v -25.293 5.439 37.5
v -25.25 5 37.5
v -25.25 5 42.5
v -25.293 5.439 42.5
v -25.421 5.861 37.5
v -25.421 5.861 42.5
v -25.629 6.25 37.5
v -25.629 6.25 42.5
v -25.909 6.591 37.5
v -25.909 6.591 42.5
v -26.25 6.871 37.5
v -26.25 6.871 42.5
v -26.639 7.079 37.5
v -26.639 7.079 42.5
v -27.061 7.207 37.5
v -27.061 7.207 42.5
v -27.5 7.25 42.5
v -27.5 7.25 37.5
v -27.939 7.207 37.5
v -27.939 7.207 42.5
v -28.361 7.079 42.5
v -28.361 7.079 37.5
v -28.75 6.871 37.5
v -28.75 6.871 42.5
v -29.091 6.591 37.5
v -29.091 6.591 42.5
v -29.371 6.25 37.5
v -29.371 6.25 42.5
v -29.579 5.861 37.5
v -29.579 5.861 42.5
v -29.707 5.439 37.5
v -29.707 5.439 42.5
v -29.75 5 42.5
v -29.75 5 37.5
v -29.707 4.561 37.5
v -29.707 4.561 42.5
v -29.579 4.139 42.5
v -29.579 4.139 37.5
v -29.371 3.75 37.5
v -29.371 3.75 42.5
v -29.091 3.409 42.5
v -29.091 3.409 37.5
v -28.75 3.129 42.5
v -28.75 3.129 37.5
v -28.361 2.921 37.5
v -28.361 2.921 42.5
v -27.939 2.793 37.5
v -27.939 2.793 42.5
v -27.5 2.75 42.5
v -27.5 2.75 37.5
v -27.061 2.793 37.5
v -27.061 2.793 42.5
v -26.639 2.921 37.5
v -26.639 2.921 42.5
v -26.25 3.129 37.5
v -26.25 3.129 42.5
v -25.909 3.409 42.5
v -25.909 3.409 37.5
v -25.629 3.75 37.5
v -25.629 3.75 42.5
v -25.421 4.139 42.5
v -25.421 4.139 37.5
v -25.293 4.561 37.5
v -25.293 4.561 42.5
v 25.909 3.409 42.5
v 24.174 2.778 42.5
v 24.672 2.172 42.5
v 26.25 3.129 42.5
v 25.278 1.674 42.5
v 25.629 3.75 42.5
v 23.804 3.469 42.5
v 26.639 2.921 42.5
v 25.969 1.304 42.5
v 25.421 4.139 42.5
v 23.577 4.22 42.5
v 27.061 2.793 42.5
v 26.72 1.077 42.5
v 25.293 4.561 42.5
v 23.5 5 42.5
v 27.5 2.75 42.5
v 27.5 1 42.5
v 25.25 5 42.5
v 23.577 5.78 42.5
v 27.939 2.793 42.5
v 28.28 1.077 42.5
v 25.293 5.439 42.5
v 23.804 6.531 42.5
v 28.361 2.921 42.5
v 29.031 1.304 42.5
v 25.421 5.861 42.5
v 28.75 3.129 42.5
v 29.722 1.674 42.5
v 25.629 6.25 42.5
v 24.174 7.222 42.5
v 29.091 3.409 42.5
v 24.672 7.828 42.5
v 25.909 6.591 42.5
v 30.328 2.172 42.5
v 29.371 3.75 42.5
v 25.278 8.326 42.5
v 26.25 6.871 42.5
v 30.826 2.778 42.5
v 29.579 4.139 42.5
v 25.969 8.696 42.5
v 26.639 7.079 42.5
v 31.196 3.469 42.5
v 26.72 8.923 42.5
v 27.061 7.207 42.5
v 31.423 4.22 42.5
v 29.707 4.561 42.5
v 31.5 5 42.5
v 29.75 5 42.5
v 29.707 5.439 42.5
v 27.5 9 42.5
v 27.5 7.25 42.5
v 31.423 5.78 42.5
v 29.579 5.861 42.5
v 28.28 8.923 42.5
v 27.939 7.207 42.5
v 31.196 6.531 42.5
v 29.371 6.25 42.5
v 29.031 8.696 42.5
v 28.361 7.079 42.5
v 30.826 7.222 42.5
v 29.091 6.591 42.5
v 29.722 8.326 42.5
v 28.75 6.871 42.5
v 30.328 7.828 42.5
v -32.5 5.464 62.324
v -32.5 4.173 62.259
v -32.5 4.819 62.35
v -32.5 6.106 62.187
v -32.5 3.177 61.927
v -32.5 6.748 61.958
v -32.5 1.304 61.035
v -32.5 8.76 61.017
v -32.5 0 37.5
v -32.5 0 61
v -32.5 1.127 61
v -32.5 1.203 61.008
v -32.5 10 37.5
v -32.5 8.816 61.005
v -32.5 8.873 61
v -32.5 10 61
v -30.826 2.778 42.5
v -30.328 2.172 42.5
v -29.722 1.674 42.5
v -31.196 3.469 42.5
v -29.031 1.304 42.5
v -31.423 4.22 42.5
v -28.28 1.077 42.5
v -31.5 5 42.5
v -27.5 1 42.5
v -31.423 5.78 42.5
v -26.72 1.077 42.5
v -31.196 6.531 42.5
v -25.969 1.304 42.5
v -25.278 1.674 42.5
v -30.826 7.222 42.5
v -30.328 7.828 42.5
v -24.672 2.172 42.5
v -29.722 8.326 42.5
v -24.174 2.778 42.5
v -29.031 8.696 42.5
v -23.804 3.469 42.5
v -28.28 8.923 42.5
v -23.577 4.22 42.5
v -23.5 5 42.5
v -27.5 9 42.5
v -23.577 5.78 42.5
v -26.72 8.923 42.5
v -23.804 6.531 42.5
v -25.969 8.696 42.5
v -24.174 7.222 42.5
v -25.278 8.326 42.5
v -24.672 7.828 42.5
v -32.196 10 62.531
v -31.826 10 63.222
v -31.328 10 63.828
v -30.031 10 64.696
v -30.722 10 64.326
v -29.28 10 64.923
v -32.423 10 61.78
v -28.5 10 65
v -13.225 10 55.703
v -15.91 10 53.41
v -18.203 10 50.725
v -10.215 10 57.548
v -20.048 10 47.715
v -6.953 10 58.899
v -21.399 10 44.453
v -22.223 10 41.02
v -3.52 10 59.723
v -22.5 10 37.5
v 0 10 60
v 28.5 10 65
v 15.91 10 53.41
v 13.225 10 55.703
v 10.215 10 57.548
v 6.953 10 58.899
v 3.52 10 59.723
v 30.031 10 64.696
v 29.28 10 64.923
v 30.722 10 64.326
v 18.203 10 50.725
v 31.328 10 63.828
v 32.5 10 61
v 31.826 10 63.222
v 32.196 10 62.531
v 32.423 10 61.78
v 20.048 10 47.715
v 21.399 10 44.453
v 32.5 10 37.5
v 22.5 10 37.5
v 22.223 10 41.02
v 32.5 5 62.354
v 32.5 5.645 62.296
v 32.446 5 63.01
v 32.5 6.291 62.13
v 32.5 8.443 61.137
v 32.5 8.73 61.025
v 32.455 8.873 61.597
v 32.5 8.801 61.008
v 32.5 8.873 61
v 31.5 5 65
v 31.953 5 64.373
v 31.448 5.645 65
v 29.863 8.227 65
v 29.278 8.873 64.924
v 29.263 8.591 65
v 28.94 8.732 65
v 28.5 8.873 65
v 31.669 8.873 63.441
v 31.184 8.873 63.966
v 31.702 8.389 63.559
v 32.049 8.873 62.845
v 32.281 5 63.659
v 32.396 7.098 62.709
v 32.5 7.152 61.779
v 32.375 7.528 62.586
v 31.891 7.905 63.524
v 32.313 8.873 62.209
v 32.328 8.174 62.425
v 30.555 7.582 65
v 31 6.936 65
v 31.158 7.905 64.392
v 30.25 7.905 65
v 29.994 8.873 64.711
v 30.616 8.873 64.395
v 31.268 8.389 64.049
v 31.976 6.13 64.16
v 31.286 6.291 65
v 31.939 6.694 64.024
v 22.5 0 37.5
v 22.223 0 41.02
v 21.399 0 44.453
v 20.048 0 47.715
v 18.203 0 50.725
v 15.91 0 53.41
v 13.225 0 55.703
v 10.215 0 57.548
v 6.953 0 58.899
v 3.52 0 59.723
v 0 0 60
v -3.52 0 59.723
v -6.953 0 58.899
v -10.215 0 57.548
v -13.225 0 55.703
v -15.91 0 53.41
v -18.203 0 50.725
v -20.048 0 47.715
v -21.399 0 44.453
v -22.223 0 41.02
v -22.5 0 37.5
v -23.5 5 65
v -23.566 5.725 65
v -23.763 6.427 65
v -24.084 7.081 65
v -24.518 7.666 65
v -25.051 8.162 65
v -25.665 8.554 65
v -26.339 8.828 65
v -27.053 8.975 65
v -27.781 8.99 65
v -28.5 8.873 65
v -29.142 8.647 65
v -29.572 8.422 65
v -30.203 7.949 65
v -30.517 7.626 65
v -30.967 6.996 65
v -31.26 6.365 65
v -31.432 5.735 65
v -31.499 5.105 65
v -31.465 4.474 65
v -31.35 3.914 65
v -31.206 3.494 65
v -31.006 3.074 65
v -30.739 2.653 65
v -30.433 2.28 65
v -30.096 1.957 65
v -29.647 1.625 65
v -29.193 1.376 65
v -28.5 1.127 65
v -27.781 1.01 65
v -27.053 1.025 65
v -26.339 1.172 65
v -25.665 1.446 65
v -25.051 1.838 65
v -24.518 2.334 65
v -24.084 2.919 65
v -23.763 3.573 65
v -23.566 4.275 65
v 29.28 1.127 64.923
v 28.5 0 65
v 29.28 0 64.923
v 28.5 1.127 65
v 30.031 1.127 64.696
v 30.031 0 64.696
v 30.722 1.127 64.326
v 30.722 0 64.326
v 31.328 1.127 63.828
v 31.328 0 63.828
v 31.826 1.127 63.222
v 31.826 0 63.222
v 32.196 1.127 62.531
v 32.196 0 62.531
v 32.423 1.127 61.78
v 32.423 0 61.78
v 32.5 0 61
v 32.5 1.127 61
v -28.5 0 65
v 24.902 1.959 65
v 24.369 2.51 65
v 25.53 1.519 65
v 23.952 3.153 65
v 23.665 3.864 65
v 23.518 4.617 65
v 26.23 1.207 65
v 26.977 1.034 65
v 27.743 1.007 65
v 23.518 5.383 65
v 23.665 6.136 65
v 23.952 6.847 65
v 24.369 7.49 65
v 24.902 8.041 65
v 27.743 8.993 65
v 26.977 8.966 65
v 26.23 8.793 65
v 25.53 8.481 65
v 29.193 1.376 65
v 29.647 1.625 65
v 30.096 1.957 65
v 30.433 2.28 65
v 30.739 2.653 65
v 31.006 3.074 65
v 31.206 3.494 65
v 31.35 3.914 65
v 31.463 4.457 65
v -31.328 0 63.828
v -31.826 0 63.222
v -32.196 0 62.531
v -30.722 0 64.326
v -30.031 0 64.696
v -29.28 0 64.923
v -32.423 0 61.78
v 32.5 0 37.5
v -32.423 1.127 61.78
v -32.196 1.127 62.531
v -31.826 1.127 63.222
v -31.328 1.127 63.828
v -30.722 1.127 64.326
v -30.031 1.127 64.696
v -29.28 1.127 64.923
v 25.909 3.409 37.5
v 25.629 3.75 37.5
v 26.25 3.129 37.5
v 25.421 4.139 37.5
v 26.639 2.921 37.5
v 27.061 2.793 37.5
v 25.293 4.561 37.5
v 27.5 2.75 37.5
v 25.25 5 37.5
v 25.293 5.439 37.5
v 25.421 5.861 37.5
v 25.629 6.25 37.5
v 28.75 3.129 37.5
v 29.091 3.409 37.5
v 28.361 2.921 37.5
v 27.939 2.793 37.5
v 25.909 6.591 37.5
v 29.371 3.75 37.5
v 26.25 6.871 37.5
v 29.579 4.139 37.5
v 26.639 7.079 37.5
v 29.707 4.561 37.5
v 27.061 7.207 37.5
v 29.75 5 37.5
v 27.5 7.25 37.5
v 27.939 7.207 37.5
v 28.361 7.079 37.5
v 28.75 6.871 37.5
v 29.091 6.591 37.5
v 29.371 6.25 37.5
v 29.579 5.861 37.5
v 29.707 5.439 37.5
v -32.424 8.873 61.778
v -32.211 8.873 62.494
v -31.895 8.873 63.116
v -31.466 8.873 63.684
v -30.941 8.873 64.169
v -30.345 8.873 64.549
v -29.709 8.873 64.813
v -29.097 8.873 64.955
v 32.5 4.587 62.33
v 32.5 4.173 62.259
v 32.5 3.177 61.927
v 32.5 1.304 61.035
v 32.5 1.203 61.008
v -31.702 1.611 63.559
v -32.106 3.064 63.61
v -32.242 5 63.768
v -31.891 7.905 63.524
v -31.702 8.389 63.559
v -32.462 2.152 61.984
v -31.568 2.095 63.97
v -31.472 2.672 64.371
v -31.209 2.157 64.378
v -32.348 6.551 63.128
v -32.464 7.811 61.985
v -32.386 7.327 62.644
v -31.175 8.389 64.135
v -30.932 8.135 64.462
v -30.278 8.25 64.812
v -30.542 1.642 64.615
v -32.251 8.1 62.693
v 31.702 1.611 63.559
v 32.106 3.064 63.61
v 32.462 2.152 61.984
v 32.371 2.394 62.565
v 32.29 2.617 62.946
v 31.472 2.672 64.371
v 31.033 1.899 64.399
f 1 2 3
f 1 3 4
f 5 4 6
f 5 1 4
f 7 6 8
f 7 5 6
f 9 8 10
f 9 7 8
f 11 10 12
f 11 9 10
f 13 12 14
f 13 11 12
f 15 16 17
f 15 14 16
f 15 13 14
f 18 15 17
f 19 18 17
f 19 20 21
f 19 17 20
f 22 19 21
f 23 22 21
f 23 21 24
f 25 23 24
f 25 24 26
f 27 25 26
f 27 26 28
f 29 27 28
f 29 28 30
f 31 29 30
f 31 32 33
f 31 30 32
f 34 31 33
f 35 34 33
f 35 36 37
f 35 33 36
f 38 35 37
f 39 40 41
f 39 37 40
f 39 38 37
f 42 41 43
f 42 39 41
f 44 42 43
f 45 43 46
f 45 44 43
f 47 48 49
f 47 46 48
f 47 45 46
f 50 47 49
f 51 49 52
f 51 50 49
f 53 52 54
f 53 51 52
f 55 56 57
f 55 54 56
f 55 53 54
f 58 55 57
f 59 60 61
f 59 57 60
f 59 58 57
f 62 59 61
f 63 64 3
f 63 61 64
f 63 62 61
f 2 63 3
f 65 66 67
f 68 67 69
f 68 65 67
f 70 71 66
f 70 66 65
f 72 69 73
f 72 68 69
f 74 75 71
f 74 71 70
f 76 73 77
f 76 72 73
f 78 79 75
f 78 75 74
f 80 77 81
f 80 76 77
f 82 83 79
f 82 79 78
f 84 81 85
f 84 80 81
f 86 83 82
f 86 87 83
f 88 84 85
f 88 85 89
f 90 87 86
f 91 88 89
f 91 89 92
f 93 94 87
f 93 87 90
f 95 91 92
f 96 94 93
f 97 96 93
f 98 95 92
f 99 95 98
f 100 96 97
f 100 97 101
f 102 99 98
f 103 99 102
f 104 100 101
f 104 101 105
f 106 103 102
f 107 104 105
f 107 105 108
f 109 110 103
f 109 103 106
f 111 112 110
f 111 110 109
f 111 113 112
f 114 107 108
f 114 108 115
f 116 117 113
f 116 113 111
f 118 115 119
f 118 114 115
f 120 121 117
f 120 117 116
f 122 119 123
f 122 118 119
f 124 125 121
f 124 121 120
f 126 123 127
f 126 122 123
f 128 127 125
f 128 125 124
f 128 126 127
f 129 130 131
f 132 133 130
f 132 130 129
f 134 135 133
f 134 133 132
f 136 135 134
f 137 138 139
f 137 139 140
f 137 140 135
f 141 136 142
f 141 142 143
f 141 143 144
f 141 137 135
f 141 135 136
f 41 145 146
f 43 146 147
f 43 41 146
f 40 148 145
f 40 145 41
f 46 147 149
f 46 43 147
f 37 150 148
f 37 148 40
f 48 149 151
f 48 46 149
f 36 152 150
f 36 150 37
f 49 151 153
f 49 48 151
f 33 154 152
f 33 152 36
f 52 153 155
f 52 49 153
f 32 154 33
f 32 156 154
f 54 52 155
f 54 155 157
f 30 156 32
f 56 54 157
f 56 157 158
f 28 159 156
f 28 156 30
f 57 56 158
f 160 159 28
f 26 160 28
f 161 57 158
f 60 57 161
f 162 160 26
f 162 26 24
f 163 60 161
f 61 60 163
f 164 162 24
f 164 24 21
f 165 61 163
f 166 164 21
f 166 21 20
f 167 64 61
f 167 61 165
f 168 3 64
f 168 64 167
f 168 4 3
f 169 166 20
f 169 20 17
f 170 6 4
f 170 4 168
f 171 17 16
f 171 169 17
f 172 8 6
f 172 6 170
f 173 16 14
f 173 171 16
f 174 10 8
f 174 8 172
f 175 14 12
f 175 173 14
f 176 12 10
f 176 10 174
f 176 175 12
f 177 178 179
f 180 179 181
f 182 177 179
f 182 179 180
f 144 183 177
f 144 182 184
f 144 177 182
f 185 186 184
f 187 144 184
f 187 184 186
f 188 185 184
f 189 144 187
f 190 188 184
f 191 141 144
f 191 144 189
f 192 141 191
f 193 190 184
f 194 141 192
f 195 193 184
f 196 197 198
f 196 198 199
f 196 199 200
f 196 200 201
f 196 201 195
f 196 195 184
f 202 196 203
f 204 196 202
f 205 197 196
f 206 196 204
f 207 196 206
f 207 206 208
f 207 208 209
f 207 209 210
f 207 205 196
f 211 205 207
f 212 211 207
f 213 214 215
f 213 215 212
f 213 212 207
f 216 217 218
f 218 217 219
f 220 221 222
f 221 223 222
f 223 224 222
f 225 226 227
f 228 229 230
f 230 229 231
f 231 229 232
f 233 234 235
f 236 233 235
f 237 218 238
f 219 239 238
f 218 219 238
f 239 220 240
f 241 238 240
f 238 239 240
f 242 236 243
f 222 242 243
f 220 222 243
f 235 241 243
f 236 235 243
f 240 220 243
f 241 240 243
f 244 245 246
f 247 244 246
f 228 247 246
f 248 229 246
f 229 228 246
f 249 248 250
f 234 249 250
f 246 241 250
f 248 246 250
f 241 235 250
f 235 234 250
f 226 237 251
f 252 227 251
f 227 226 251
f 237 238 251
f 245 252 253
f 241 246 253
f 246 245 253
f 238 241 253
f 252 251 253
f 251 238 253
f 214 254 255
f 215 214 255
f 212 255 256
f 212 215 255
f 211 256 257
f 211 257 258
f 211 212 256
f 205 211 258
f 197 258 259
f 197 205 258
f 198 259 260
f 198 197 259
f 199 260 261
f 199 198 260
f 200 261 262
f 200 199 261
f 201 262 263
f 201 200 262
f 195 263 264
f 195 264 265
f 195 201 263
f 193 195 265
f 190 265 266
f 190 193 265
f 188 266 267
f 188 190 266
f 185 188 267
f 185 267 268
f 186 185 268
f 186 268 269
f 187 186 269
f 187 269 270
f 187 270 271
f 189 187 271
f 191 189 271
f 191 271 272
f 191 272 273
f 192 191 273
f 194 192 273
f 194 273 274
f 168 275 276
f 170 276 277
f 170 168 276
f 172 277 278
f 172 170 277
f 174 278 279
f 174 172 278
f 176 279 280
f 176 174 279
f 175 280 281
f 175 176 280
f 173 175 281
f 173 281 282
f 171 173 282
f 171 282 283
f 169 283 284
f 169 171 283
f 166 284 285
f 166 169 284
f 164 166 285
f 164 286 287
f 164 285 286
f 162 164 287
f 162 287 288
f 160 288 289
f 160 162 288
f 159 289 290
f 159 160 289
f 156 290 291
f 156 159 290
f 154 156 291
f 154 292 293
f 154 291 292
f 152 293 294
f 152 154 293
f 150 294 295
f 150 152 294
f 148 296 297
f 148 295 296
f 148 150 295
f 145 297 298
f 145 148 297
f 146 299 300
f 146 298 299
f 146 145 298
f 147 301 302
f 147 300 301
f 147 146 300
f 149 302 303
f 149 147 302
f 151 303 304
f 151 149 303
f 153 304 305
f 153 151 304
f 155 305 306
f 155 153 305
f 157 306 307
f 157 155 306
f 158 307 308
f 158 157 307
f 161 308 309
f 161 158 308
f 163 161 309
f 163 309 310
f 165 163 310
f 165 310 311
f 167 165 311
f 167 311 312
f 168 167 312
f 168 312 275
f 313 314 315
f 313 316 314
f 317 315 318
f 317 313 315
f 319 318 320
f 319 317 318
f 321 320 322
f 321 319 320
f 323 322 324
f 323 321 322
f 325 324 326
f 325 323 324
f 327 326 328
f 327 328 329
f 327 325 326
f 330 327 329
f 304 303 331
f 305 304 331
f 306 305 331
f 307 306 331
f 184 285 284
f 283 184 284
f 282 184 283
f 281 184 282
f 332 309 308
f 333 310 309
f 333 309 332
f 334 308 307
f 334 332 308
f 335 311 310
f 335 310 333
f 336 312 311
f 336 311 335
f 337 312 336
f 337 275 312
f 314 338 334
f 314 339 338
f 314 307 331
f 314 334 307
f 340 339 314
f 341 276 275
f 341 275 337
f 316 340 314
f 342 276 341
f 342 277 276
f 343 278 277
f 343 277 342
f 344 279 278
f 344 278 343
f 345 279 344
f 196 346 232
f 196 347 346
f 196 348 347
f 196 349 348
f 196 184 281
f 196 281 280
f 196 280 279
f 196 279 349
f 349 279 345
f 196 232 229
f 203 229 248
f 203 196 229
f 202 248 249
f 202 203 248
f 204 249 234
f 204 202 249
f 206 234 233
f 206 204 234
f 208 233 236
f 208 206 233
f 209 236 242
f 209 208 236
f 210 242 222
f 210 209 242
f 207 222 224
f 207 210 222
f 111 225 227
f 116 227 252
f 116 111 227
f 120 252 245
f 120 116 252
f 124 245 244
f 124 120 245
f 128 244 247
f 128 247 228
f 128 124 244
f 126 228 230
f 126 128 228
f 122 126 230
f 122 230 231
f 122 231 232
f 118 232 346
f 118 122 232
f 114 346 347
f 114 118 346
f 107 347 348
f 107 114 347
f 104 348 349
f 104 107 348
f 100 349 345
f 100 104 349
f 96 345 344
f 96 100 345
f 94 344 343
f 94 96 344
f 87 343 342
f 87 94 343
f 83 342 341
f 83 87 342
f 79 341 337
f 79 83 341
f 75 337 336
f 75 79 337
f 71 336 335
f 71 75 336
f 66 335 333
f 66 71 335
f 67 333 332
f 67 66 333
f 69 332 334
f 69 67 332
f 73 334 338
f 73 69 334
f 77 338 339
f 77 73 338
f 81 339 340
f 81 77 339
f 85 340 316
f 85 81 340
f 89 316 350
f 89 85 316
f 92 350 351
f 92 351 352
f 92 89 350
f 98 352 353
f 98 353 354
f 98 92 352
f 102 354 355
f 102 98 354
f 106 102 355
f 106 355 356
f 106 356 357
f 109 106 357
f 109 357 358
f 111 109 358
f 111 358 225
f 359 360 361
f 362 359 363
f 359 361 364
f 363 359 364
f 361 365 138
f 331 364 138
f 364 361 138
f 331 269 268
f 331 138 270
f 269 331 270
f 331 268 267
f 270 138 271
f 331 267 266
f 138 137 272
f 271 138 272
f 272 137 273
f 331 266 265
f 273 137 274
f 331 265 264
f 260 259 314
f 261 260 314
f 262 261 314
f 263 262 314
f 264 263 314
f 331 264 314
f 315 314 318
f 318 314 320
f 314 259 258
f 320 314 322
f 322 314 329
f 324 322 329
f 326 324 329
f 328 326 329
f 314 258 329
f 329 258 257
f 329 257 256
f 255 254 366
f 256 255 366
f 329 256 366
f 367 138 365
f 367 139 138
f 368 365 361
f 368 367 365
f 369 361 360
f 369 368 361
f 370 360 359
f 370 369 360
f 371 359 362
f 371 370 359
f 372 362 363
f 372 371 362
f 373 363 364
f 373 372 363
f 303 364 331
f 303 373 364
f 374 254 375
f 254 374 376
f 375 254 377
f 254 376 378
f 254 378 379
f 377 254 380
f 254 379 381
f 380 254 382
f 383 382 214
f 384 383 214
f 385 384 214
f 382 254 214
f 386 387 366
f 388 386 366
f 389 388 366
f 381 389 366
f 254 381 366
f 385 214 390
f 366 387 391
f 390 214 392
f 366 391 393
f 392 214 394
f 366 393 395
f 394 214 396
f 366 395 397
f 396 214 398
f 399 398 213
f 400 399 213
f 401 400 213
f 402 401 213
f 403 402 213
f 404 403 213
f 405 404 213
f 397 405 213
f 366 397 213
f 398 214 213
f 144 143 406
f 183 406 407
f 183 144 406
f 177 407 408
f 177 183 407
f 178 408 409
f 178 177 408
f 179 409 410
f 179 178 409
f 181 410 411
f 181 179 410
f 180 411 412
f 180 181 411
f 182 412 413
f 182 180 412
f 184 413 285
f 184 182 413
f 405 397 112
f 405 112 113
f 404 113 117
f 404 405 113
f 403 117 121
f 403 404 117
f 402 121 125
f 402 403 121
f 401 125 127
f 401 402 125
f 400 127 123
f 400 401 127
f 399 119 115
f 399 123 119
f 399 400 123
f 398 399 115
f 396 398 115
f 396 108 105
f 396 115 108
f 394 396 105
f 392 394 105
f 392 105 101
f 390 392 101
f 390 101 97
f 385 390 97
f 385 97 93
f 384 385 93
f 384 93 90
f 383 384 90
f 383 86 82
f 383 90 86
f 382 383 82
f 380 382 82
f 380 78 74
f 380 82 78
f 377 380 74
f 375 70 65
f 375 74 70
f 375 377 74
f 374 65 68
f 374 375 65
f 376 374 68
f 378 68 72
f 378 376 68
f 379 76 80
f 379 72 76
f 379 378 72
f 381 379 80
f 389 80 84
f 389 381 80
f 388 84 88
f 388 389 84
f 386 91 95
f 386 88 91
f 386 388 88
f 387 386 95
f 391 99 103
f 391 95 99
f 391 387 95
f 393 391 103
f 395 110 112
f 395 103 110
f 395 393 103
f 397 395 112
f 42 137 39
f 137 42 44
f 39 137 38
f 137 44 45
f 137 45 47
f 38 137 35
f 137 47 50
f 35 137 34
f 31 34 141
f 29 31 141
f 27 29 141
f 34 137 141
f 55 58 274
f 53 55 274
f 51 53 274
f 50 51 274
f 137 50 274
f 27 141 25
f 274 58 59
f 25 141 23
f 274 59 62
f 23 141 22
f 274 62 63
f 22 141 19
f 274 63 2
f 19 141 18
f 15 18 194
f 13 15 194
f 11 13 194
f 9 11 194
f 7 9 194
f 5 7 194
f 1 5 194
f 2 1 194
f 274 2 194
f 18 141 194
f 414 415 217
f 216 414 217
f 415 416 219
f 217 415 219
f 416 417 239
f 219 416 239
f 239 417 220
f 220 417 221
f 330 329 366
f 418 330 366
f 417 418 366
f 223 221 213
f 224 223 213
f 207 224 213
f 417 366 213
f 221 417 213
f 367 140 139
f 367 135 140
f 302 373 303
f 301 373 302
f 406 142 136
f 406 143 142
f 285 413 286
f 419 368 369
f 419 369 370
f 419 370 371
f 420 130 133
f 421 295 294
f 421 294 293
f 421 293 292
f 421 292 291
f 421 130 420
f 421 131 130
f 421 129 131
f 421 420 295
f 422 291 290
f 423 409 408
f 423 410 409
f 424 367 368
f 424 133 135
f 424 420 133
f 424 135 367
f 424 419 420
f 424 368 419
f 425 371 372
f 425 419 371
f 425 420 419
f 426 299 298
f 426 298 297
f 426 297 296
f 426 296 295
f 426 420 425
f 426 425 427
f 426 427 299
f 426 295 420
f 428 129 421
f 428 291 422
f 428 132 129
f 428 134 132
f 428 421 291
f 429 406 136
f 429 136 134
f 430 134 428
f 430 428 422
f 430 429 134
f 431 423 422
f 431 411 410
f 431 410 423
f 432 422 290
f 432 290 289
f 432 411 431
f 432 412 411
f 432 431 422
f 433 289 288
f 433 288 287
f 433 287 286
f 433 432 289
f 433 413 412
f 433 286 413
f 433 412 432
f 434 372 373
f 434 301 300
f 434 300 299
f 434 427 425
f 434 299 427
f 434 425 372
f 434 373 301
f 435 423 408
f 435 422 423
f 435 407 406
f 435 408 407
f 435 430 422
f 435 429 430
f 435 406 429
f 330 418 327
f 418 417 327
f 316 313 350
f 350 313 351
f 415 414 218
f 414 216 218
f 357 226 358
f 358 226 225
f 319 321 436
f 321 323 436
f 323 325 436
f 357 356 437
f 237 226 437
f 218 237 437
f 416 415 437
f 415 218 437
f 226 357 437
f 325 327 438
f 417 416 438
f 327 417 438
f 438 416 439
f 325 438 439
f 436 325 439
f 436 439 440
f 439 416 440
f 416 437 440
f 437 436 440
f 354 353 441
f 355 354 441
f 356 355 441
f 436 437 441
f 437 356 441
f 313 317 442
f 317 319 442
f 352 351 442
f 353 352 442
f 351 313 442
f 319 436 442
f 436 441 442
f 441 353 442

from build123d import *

# Parameters (mm, degrees)
CYLINDER001_R     = 22.5
CYLINDER001_DEPTH = 10
CYLINDER017_R     = 4
CYLINDER017_DEPTH = 22.5
CYLINDER016_R     = 4
CYLINDER016_DEPTH = 22.5
CYLINDER015_R     = 4
CYLINDER015_DEPTH = 28.5
CYLINDER013_R     = 2.25
CYLINDER013_DEPTH = 65
CYLINDER012_R     = 2.25
CYLINDER012_DEPTH = 65
PAD004_DEPTH      = 4
PAD003_DEPTH      = 4
CYLINDER014_R     = 4
CYLINDER014_DEPTH = 28.5
BOX002_W          = 65
BOX002_H          = 10
BOX002_DEPTH      = 27.5
FILLET001_R       = 4


with BuildPart() as cylinder001:
    # Cylinder001 → Cylinder001 (new body)
    with BuildSketch(Plane(origin=(0, 10, 37.5), x_dir=(1, 0, 0), z_dir=(0, -1, 0))):
        Circle(CYLINDER001_R)
    extrude(amount=CYLINDER001_DEPTH)


with BuildPart() as cylinder017:
    # Cylinder017 → Cylinder017 (new body)
    with BuildSketch(Plane(origin=(-27.5, 5, 0), x_dir=(1, 0, 0), z_dir=(0, 0, 1))):
        Circle(CYLINDER017_R)
    extrude(amount=CYLINDER017_DEPTH)


with BuildPart() as fusion009:
    # Cylinder016 → Cylinder016 (new body)
    with BuildSketch(Plane(origin=(27.5, 5, 0), x_dir=(1, 0, 0), z_dir=(0, 0, 1))):
        Circle(CYLINDER016_R)
    extrude(amount=CYLINDER016_DEPTH)

    # Fusion009: union Cylinder017
    add(cylinder017.part)


with BuildPart() as fusion009_1:
    # Fusion009 placement: moved
    add(fusion009.part.moved(Location((0, 0, 42.5))))


with BuildPart() as cylinder015:
    # Cylinder015 → Cylinder015 (new body)
    with BuildSketch(Plane(origin=(-27.5, 5, 0), x_dir=(1, 0, 0), z_dir=(0, 0, 1))):
        Circle(CYLINDER015_R)
    extrude(amount=CYLINDER015_DEPTH)


with BuildPart() as cylinder013:
    # Cylinder013 → Cylinder013 (new body)
    with BuildSketch(Plane(origin=(-27.5, 5, 0), x_dir=(1, 0, 0), z_dir=(0, 0, 1))):
        Circle(CYLINDER013_R)
    extrude(amount=CYLINDER013_DEPTH)


with BuildPart() as fusion007:
    # Cylinder012 → Cylinder012 (new body)
    with BuildSketch(Plane(origin=(27.5, 5, 0), x_dir=(1, 0, 0), z_dir=(0, 0, 1))):
        Circle(CYLINDER012_R)
    extrude(amount=CYLINDER012_DEPTH)

    # Fusion007: union Cylinder013
    add(cylinder013.part)


with BuildPart() as m4press003:
    # Sketch004 → Pad004 (new body)
    with BuildSketch(Plane.XY):
        Polygon((4, 0), (2, 3.464102), (-2, 3.464102), (-4, 0), (-2, -3.464102), (2, -3.464102), align=None)
    extrude(amount=PAD004_DEPTH)


with BuildPart() as m4press003_1:
    # Body004 placement: moved
    add(m4press003.part.moved(Location((27.5, 5, 28.5))))


with BuildPart() as m4press002:
    # Sketch003 → Pad003 (new body)
    with BuildSketch(Plane.XY):
        Polygon((4, 0), (2, 3.464102), (-2, 3.464102), (-4, 0), (-2, -3.464102), (2, -3.464102), align=None)
    extrude(amount=PAD003_DEPTH)


with BuildPart() as m4press002_1:
    # Body003 placement: moved
    add(m4press002.part.moved(Location((-27.5, 5, 28.5))))


with BuildPart() as connectors001:
    # Cylinder014 → Cylinder014 (new body)
    with BuildSketch(Plane(origin=(27.5, 5, 0), x_dir=(1, 0, 0), z_dir=(0, 0, 1))):
        Circle(CYLINDER014_R)
    extrude(amount=CYLINDER014_DEPTH)

    # Fusion008: union Cylinder015, Fusion007, M4Press003, M4Press002
    add(cylinder015.part)
    add(fusion007.part)
    add(m4press003_1.part)
    add(m4press002_1.part)


with BuildPart() as upper_part:
    # Box002 → Box002 (new body)
    with BuildSketch(Plane(origin=(-32.5, 0, 37.5), x_dir=(1, 0, 0), z_dir=(0, 0, 1))):
        with Locations((32.5, 5)):
            Rectangle(BOX002_W, BOX002_H)
    extrude(amount=BOX002_DEPTH)

    # Cut003: cut Connectors001
    add(connectors001.part, mode=Mode.SUBTRACT)

    # Cut004: cut Fusion009
    add(fusion009_1.part, mode=Mode.SUBTRACT)

    # Cut005: cut Cylinder001
    add(cylinder001.part, mode=Mode.SUBTRACT)

    # Fillet001
    fillet001_edges = [upper_part.edges().sort_by_distance(p)[0] for p in [
        (-32.5, 5, 65),
        (32.5, 5, 65),
    ]]
    fillet(fillet001_edges, radius=FILLET001_R)


solid = upper_part.part
